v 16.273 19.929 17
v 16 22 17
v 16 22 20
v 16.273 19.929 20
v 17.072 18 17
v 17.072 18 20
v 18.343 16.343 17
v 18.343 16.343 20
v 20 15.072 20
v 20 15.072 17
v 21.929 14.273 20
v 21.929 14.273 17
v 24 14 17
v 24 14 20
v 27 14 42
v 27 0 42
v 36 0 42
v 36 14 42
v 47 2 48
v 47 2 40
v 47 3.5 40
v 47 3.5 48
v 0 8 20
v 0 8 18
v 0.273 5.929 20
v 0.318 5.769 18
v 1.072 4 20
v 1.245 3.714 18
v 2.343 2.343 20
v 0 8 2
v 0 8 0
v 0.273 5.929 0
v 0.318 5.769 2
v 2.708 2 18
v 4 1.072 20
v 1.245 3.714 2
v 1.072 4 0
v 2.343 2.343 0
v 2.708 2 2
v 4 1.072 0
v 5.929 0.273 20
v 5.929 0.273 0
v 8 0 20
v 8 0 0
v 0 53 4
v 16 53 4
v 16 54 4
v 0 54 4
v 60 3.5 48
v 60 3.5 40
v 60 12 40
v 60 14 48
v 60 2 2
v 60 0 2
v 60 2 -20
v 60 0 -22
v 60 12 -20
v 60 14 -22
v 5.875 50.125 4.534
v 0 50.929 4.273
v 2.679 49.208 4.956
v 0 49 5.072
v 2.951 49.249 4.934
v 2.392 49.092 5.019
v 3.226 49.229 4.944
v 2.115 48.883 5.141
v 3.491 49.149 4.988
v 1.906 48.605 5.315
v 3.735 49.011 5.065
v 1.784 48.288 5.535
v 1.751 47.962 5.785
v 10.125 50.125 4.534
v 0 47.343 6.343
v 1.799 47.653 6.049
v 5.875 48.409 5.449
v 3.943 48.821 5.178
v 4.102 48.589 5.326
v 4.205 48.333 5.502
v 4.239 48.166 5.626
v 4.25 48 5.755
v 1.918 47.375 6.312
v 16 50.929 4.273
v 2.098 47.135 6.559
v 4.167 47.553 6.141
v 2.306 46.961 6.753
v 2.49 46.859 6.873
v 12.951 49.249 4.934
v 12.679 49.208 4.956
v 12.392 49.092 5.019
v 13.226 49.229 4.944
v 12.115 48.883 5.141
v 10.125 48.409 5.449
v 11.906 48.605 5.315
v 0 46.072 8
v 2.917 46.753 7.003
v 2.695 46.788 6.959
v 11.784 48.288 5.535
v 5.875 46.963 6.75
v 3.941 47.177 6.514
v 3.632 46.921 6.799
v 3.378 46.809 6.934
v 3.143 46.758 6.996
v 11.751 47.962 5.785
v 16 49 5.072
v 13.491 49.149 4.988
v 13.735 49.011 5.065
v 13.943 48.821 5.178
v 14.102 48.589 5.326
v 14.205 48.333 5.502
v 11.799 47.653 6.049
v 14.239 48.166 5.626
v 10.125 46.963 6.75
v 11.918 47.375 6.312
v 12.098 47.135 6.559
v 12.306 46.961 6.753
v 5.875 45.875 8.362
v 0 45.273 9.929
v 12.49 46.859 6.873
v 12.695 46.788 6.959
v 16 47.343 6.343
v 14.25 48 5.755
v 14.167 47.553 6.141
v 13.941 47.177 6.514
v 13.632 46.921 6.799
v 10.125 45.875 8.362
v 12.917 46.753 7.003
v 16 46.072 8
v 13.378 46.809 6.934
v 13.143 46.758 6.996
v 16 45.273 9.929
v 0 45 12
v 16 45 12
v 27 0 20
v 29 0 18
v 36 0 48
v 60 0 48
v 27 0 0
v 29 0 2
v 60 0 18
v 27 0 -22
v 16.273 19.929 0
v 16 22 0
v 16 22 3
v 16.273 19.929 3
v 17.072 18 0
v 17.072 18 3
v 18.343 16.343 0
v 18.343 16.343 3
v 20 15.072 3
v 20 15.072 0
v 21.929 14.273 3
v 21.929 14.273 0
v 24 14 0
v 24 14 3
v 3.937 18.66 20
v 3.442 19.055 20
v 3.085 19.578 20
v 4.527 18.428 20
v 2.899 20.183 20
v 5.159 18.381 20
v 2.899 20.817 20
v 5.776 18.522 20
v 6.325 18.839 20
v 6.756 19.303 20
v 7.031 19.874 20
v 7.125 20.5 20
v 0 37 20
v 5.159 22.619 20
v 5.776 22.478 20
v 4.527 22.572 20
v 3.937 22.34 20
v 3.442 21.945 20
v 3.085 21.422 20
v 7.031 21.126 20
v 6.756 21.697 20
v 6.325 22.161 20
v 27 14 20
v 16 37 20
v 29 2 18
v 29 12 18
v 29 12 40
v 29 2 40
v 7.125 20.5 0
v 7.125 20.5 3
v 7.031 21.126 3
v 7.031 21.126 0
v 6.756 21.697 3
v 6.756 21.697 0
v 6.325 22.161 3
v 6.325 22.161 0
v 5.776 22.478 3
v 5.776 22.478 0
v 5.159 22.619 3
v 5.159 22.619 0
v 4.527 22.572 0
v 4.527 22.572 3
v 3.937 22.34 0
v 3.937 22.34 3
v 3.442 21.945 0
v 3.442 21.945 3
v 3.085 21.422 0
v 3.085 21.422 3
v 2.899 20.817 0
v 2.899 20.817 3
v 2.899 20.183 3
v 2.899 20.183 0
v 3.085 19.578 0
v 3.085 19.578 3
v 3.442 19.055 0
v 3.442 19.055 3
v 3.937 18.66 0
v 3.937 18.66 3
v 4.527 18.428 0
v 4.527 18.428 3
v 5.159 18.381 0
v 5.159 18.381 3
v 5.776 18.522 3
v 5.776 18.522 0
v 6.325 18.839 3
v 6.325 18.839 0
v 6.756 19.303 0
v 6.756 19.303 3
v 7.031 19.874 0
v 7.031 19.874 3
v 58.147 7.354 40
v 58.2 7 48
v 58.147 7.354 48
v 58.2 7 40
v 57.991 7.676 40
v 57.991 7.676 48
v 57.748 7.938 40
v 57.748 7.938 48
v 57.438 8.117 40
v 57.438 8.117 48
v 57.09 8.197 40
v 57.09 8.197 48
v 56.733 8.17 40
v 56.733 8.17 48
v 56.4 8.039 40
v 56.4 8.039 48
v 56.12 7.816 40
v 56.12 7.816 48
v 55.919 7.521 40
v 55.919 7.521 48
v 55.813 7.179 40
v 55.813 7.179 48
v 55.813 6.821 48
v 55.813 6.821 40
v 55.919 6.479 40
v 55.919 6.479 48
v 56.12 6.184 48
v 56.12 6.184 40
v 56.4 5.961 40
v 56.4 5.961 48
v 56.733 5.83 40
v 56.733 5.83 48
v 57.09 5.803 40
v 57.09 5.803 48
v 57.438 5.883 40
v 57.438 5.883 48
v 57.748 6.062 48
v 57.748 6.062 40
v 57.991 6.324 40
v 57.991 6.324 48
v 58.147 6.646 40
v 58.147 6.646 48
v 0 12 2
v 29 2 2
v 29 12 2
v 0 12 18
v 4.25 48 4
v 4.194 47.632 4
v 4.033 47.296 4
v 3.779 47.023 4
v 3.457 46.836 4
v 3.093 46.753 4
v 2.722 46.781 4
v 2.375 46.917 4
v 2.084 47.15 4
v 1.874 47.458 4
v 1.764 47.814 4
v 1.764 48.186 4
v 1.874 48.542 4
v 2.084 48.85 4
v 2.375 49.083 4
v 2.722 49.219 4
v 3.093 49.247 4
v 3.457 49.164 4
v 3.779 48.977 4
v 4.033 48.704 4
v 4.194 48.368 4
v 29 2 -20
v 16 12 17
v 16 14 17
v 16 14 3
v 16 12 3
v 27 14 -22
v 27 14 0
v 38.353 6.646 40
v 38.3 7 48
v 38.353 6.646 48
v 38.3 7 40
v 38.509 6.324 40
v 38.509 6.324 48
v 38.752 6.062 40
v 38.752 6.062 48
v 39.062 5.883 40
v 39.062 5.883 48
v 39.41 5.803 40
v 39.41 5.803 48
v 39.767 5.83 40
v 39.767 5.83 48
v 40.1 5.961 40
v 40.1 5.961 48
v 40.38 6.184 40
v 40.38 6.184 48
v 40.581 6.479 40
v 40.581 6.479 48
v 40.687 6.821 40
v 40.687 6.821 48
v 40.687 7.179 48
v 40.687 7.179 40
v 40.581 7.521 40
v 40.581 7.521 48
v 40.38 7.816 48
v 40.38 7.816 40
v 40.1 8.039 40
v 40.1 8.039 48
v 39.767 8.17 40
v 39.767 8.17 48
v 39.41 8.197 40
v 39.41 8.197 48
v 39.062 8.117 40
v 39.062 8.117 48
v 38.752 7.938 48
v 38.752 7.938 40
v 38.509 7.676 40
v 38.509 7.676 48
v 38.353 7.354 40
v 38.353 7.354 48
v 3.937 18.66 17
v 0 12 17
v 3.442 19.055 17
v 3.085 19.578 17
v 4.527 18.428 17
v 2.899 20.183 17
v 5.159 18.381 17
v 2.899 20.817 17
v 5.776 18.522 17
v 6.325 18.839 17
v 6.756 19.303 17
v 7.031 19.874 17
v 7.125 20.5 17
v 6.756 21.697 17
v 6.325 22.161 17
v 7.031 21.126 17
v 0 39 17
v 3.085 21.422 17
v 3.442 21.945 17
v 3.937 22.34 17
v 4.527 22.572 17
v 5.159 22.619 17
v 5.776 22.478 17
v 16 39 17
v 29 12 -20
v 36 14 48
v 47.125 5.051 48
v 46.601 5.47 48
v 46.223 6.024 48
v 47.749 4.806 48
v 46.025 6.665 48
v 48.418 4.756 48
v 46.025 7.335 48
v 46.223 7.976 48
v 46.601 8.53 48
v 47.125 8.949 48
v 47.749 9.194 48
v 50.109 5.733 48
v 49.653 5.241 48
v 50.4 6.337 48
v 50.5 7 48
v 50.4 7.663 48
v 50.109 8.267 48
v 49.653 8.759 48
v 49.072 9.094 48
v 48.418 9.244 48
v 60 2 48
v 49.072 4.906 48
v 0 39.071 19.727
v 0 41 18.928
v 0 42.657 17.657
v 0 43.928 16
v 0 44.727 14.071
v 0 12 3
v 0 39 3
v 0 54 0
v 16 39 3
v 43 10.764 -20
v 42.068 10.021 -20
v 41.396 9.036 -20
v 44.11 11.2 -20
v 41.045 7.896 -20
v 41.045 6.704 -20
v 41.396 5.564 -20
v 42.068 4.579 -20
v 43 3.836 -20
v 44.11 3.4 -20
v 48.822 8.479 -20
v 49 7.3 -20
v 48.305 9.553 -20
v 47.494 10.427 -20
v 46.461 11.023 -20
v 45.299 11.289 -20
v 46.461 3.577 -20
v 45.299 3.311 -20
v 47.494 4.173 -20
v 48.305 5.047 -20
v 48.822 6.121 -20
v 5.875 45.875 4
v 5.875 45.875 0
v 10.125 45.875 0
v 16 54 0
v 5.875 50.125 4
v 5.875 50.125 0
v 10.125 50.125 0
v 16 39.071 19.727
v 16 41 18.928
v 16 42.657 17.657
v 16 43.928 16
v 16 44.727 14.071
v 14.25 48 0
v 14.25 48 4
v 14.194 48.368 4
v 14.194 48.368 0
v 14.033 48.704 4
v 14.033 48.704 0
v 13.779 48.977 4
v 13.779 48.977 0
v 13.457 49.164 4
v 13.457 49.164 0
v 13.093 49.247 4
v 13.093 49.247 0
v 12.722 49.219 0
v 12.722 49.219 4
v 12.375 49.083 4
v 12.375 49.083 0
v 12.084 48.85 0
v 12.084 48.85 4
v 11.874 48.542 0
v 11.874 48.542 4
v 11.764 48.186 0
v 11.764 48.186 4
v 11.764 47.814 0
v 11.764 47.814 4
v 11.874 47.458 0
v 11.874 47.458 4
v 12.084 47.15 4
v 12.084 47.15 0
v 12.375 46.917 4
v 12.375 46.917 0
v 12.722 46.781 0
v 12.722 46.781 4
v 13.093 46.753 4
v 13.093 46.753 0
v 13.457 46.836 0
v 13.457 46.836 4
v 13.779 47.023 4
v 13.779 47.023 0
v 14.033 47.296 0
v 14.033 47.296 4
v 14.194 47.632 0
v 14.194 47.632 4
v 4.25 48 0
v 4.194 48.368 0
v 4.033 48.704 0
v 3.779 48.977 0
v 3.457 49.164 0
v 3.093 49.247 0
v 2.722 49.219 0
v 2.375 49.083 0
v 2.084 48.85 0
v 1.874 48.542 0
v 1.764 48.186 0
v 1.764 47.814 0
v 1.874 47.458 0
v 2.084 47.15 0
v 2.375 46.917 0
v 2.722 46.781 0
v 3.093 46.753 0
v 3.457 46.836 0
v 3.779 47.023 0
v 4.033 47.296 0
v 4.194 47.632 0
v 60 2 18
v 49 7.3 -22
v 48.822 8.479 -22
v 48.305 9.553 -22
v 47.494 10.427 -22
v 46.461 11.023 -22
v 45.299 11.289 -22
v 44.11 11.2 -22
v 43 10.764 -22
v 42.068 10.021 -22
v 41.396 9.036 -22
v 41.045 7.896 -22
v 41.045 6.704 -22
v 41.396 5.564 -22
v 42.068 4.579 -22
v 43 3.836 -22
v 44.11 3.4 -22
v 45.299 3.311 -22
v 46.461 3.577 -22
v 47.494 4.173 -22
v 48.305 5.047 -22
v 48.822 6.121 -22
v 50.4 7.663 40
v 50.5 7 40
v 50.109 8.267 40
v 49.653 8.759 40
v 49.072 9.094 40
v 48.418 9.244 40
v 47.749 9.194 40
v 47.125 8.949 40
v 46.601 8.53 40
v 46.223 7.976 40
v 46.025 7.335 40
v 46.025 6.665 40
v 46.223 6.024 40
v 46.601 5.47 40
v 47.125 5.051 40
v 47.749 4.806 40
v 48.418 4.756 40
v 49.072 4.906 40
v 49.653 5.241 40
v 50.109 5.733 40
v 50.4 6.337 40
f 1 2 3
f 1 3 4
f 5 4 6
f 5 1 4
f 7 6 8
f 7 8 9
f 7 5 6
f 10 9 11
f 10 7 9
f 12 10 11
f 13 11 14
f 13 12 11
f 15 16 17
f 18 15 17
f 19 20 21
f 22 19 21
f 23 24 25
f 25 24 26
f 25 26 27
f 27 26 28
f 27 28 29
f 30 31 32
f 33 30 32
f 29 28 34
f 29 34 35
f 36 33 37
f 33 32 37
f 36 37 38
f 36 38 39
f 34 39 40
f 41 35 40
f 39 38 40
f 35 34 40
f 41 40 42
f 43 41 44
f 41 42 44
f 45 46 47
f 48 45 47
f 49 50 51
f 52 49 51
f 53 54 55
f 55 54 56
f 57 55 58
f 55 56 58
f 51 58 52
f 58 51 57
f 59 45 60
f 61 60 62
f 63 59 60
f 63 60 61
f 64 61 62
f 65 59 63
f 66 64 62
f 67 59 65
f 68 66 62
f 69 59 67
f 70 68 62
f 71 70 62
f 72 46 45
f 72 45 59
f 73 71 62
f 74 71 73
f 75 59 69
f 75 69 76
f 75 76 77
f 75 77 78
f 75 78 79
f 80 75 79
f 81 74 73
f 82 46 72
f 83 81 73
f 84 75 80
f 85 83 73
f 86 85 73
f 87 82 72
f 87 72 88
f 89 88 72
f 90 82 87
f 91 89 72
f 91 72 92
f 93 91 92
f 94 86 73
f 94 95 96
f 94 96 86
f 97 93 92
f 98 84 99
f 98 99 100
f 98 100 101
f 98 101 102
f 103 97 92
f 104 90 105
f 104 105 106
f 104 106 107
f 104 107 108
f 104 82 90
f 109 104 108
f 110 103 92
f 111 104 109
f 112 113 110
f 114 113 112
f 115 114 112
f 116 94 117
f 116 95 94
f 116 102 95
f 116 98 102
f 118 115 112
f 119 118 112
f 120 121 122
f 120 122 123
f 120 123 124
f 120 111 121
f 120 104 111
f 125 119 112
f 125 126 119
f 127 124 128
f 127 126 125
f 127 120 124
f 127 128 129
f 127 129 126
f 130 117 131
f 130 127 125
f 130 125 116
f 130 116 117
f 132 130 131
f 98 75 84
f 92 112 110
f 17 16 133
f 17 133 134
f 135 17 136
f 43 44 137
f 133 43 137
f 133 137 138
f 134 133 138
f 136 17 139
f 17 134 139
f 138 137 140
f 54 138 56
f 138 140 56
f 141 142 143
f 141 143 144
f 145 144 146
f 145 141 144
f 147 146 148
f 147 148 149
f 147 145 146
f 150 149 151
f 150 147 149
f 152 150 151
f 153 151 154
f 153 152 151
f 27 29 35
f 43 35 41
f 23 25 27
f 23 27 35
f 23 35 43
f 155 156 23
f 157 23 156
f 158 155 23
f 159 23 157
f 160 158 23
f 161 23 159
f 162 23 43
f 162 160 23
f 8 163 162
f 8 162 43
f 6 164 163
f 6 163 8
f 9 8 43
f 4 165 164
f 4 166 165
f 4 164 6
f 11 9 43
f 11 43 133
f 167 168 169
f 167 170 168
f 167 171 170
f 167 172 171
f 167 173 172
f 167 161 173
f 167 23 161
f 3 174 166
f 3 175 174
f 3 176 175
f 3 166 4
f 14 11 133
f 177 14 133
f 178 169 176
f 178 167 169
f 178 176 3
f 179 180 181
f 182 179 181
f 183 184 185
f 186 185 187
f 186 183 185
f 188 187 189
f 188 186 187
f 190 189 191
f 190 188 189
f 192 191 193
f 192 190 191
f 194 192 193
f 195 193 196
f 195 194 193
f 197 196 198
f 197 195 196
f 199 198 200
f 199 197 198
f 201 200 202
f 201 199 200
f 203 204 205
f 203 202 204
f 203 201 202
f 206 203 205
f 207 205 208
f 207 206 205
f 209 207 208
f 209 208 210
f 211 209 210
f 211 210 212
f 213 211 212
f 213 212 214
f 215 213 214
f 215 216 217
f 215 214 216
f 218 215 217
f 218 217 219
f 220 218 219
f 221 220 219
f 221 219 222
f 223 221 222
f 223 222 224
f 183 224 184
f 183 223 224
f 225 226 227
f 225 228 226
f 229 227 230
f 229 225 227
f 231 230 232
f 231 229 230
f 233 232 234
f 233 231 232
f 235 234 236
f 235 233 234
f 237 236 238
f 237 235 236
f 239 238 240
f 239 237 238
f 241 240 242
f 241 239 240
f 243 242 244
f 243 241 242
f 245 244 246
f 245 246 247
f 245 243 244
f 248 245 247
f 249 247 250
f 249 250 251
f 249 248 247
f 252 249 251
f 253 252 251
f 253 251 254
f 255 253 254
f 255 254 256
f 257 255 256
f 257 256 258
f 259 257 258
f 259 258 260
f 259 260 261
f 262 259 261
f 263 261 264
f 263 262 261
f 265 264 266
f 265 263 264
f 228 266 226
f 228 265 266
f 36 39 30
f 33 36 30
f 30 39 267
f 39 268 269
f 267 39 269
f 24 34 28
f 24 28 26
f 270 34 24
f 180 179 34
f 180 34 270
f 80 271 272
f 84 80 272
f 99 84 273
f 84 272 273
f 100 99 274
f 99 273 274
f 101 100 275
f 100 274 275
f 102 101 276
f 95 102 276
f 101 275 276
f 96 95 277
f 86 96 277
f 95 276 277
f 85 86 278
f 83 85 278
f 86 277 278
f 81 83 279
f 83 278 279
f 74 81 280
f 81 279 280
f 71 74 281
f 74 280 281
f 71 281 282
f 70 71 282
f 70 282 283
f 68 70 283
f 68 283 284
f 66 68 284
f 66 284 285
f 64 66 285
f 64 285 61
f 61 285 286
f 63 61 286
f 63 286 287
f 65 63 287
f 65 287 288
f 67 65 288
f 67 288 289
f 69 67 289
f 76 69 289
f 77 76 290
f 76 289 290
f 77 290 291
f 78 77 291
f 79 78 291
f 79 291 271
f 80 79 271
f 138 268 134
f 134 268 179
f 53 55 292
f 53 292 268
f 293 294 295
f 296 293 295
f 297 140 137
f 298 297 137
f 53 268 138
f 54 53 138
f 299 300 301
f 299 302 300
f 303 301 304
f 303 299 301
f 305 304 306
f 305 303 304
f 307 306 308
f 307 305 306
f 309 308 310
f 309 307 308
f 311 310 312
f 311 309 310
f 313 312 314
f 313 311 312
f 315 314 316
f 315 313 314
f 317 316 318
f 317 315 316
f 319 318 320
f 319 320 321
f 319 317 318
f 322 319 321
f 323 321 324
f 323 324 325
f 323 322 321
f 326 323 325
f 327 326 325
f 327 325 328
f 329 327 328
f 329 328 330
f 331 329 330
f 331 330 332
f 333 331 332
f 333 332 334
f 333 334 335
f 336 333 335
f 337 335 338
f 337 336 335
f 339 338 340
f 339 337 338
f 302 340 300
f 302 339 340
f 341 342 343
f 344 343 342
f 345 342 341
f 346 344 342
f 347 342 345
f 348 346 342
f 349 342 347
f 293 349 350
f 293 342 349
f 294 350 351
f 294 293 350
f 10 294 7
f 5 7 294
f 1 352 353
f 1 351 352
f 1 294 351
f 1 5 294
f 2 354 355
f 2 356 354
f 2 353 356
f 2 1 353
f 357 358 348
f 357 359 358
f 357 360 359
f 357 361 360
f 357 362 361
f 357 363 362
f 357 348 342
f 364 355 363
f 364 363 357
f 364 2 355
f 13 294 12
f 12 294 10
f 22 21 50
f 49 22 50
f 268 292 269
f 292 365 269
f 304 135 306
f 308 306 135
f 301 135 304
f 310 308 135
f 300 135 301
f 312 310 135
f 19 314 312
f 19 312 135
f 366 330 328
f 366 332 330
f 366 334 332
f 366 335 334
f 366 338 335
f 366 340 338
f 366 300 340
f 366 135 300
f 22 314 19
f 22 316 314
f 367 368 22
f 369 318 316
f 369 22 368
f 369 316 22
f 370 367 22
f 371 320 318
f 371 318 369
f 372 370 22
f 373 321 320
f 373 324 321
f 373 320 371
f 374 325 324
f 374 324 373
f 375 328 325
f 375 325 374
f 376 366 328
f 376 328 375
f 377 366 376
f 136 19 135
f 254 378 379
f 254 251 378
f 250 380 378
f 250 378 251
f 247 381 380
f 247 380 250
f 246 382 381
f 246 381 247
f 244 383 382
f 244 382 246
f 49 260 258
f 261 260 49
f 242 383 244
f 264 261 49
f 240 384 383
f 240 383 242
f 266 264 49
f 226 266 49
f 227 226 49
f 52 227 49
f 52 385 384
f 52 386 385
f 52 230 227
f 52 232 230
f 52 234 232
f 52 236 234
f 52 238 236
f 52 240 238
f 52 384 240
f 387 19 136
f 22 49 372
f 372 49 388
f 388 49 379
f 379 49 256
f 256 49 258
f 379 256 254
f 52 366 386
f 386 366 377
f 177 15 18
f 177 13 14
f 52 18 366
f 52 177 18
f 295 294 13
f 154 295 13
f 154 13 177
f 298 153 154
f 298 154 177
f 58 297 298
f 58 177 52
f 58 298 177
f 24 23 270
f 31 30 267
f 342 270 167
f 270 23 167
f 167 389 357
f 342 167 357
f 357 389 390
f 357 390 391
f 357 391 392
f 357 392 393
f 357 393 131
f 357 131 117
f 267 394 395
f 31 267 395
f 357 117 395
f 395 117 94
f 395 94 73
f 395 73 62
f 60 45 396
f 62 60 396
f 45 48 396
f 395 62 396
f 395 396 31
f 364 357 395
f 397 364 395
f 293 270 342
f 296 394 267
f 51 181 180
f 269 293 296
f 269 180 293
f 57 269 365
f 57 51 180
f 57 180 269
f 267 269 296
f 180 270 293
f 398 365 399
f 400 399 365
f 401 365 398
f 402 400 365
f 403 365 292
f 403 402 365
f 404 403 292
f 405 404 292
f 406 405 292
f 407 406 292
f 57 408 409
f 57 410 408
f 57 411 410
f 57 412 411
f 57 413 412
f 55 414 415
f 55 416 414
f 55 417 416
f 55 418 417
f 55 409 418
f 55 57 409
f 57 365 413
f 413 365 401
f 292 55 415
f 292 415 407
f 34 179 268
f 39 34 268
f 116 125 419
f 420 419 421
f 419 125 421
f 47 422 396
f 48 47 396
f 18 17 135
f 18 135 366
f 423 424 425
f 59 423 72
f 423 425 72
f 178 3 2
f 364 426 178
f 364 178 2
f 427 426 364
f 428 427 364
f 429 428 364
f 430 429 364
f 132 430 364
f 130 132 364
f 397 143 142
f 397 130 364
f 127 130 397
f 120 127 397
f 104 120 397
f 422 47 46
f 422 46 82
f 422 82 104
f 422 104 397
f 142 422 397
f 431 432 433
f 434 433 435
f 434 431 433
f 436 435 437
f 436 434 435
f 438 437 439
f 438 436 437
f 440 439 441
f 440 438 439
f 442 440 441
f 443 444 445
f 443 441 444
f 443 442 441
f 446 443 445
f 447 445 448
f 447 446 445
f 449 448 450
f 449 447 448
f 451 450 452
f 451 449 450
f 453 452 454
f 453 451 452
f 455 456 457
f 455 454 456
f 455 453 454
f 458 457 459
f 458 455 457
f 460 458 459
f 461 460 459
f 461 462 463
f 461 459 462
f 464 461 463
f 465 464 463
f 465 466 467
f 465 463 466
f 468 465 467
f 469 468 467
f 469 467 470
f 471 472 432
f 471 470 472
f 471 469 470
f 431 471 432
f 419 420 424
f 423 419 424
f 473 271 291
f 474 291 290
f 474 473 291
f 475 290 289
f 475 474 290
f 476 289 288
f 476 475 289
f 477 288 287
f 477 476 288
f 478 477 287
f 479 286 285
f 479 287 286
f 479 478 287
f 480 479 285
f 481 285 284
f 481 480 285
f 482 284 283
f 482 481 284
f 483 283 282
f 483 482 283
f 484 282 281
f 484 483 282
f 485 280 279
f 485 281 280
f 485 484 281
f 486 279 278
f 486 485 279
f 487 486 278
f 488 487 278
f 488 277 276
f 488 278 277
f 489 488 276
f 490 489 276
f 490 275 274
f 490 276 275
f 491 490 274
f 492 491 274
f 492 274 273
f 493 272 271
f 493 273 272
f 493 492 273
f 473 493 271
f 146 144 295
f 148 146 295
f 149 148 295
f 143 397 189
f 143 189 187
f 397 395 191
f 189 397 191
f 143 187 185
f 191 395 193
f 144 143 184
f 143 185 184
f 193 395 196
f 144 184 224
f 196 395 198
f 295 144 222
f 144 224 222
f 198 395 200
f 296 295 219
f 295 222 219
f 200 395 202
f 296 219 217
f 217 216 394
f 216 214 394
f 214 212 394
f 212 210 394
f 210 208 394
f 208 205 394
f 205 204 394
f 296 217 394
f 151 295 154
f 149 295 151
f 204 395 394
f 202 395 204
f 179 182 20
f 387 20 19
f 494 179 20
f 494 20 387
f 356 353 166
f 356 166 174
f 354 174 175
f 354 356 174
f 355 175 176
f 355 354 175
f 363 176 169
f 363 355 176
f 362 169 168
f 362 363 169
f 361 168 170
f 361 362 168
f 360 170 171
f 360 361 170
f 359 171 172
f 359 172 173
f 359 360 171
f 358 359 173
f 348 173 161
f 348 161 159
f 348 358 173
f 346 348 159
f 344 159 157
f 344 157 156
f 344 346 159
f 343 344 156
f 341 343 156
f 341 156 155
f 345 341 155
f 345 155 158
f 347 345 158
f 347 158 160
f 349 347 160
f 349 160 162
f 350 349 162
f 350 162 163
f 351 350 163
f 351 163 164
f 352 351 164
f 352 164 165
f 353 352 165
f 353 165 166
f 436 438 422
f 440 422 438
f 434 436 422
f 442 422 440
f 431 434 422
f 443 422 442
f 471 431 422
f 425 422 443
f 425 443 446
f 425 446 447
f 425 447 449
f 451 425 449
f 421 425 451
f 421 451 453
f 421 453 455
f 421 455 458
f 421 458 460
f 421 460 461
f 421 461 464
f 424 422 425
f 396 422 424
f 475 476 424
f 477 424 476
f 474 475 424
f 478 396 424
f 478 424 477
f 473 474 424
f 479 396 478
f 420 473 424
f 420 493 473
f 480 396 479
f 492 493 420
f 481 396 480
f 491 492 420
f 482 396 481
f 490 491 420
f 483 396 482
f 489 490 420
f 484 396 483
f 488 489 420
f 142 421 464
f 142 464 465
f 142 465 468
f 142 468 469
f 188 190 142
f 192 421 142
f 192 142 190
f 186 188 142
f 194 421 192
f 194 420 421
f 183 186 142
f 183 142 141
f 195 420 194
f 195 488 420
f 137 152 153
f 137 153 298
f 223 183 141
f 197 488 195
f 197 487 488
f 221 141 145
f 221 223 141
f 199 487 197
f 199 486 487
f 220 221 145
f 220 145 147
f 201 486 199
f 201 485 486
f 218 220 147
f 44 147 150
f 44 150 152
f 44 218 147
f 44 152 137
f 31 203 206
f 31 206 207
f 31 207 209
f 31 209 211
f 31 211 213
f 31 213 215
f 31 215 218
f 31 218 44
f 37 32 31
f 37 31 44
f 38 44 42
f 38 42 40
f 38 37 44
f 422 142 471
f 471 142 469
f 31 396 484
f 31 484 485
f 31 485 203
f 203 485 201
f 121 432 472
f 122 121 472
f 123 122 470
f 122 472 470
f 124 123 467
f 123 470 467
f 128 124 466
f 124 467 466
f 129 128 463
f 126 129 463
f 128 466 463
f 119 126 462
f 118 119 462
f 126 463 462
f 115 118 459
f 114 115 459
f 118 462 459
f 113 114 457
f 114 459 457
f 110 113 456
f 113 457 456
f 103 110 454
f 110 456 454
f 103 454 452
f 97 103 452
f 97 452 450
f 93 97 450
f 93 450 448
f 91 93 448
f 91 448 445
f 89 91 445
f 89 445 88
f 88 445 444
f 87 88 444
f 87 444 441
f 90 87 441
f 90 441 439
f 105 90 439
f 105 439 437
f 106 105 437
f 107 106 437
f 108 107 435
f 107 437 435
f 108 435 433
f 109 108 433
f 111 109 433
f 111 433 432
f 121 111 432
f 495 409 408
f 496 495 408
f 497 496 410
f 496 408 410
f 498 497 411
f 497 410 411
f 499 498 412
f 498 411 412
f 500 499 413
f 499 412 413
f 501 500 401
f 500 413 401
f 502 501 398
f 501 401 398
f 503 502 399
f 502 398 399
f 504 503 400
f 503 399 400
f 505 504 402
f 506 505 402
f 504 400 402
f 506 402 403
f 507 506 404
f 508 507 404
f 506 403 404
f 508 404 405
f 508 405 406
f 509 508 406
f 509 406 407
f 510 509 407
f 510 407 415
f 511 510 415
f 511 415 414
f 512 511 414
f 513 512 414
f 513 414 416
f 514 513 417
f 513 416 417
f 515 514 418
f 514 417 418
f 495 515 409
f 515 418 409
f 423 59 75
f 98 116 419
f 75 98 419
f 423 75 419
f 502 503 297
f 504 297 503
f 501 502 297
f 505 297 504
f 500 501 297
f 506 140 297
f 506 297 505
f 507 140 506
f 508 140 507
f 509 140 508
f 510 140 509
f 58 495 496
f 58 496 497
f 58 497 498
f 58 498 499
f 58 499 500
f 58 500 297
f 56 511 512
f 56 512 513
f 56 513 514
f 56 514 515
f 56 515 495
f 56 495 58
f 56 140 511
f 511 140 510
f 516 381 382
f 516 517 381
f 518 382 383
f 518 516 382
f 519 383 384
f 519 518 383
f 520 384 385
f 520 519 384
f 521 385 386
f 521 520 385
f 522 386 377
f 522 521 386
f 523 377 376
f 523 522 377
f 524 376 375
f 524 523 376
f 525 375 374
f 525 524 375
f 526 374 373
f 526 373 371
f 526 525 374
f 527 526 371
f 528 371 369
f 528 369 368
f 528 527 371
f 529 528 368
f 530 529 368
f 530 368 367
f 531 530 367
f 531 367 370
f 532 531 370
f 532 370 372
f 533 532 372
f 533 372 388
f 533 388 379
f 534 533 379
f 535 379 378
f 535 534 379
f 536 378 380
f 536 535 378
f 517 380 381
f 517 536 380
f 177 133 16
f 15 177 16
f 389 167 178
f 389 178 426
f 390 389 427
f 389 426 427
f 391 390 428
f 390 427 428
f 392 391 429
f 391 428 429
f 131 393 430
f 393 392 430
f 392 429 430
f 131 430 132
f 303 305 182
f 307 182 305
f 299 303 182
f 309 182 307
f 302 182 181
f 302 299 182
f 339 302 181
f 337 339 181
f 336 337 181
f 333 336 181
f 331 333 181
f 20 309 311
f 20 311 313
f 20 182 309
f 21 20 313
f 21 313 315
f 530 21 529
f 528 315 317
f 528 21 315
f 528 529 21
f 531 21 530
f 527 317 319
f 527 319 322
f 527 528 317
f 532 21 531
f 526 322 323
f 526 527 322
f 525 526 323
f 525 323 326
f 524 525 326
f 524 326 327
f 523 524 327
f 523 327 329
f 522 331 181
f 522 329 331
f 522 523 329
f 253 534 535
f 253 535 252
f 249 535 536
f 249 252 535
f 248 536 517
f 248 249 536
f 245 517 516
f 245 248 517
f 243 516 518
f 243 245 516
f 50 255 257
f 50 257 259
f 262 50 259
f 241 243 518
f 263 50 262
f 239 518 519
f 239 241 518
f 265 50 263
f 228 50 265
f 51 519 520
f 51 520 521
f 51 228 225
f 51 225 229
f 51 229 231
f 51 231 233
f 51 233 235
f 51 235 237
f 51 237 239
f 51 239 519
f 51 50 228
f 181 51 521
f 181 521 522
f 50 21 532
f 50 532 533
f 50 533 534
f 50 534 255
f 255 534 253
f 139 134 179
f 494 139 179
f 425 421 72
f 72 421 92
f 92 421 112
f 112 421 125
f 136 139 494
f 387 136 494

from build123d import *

# Parameters (mm, degrees)
SKETCH1_R           = 2.125
SKETCH1_R_2         = 1.25
SKETCH1_W           = 4.25
SKETCH1_H           = 4.25
BOSS_EXTRUDE1_DEPTH = 20
SKETCH2_W           = 14
SKETCH2_H           = 37
SKETCH2_W_2         = 16
SKETCH2_H_2         = 9
CUT_EXTRUDE1_DEPTH  = 73.470683728
SKETCH3_W           = 33
SKETCH3_H           = 22
BOSS_EXTRUDE2_DEPTH = 14
CUT_EXTRUDE2_DEPTH  = 31
SKETCH5_W           = 16
SKETCH5_H           = 10
CUT_EXTRUDE3_DEPTH  = 29
SKETCH7_R           = 4
CUT_EXTRUDE5_DEPTH  = 2
SKETCH8_W           = 24
SKETCH8_H           = 14
SKETCH8_R           = 1.2
SKETCH8_R_2         = 2.25
BOSS_EXTRUDE3_DEPTH = 6
CUT_EXTRUDE6_START  = -8
SKETCH9_R           = 2.25
SKETCH9_R_2         = 1.2
SKETCH9_W           = 13
SKETCH9_H           = 1.5
CUT_EXTRUDE6_DEPTH  = 8
FILLET1_R           = 8


with BuildPart() as part:
    # Sketch1 → Boss-Extrude1 (new body)
    with BuildSketch(Plane.XY):
        Polygon((16, 54), (0, 54), (0, 0), (60, 0), (60, 14), (16, 14), align=None)
        with Locations((5, 20.5)):
            Circle(SKETCH1_R, mode=Mode.SUBTRACT)
        with Locations((13, 48)):
            Circle(SKETCH1_R_2, mode=Mode.SUBTRACT)
        with Locations((3, 48)):
            Circle(SKETCH1_R_2, mode=Mode.SUBTRACT)
        with Locations((8, 48)):
            Rectangle(SKETCH1_W, SKETCH1_H, mode=Mode.SUBTRACT)
    extrude(amount=BOSS_EXTRUDE1_DEPTH)

    # Sketch2 → Cut-Extrude1 (cut, through all)
    with BuildSketch(Plane(origin=(16, 0, 0), x_dir=(0, 0, -1), z_dir=(1, 0, 0))):
        with Locations((-10, 20.5)):
            Rectangle(SKETCH2_W, SKETCH2_H)
        with Locations((-12, 49.5)):
            Rectangle(SKETCH2_W_2, SKETCH2_H_2)
    extrude(amount=-CUT_EXTRUDE1_DEPTH, mode=Mode.SUBTRACT)

    # Sketch3 → Boss-Extrude2 (add)
    with BuildSketch(Plane.XZ):
        with Locations((43.5, 31)):
            Rectangle(SKETCH3_W, SKETCH3_H)
        with Locations((43.5, -11)):
            Rectangle(SKETCH3_W, SKETCH3_H)
    extrude(amount=-BOSS_EXTRUDE2_DEPTH)

    # Sketch4 → Cut-Extrude2 (cut)
    with BuildSketch(Plane(origin=(60, 0, 0), x_dir=(0, 0, -1), z_dir=(1, 0, 0))):
        Polygon((-18, 0), (-18, 2), (-40, 2), (-40, 12), (20, 12), (20, 2), (-2, 2), (-2, 0), align=None)
    extrude(amount=-CUT_EXTRUDE2_DEPTH, mode=Mode.SUBTRACT)

    # Sketch5 → Cut-Extrude3 (cut)
    with BuildSketch(Plane(origin=(29, 0, 0), x_dir=(0, 0, -1), z_dir=(1, 0, 0))):
        with Locations((-10, 7)):
            Rectangle(SKETCH5_W, SKETCH5_H)
    extrude(amount=-CUT_EXTRUDE3_DEPTH, mode=Mode.SUBTRACT)

    # Sketch7 → Cut-Extrude5 (cut)
    with BuildSketch(Plane.XY.offset(-20)):
        with Locations((45, 7.3)):
            Circle(SKETCH7_R)
    extrude(amount=-CUT_EXTRUDE5_DEPTH, mode=Mode.SUBTRACT)

    # Sketch8 → Boss-Extrude3 (add)
    with BuildSketch(Plane.XY.offset(42)):
        with Locations((48, 7)):
            Rectangle(SKETCH8_W, SKETCH8_H)
        with Locations((57, 7)):
            Circle(SKETCH8_R, mode=Mode.SUBTRACT)
        with Locations((48.25, 7)):
            Circle(SKETCH8_R_2, mode=Mode.SUBTRACT)
        with Locations(Location((39.5, 7, 0), (0, 0, 180))):
            Circle(SKETCH8_R, mode=Mode.SUBTRACT)
    extrude(amount=BOSS_EXTRUDE3_DEPTH)

    # Sketch9 → Cut-Extrude6 (cut)
    with BuildSketch(Plane.XY.offset(48).offset(CUT_EXTRUDE6_START)):
        with Locations((48.25, 7)):
            Circle(SKETCH9_R)
        with Locations((57, 7)):
            Circle(SKETCH9_R_2)
        with Locations(Location((39.5, 7, 0), (0, 0, 180))):
            Circle(SKETCH9_R_2)
        with Locations((53.5, 2.75)):
            Rectangle(SKETCH9_W, SKETCH9_H)
    extrude(amount=CUT_EXTRUDE6_DEPTH, mode=Mode.SUBTRACT)

    # Fillet1
    # the kernel refuses this fillet: 8 mm, written as the material it adds along each edge
    with BuildSketch(Plane(origin=(16, 14, 0), x_dir=(0, 1, 0), z_dir=(0, 0, 1)), Plane(origin=(16, 14, 17), x_dir=(0, 1, 0), z_dir=(0, 0, 1))) as fillet1_piece_1:
        with BuildLine():
            CenterArc((FILLET1_R, -FILLET1_R), FILLET1_R, 90, 90)
            Line((0, -FILLET1_R), (0, 0))
            Line((0, 0), (FILLET1_R, 0))
        make_face()
    extrude(amount=3)
    with BuildSketch(Plane(origin=(16, 14, -20), x_dir=(0, 1, 0), z_dir=(0, 0, 1))) as fillet1_piece_2_section:
        with BuildLine():
            CenterArc((FILLET1_R, -FILLET1_R), FILLET1_R, 90, 90)
            Line((0, -FILLET1_R), (0, 0))
            Line((0, 0), (FILLET1_R, 0))
        make_face()
    fillet1_piece_2 = extrude(amount=43, mode=Mode.PRIVATE)
    fillet1_piece_2 = split(fillet1_piece_2, bisect_by=Plane(origin=(17.786943512, 15.786943512, 17), z_dir=(0, 0, 1)), keep=Keep.TOP, mode=Mode.PRIVATE)
    fillet1_piece_2 = split(fillet1_piece_2, bisect_by=Plane(origin=(17.786943512, 15.786943512, 20), z_dir=(0, 0, -1)), keep=Keep.TOP, mode=Mode.PRIVATE)
    add(fillet1_piece_2)
    with BuildSketch(Plane(origin=(16, 14, -3), x_dir=(0, 1, 0), z_dir=(0, 0, 1))) as fillet1_piece_3_section:
        with BuildLine():
            CenterArc((FILLET1_R, -FILLET1_R), FILLET1_R, 90, 90)
            Line((0, -FILLET1_R), (0, 0))
            Line((0, 0), (FILLET1_R, 0))
        make_face()
    fillet1_piece_3 = extrude(amount=43, mode=Mode.PRIVATE)
    fillet1_piece_3 = split(fillet1_piece_3, bisect_by=Plane(origin=(17.786943512, 15.786943512, 3), z_dir=(0, 0, -1)), keep=Keep.TOP, mode=Mode.PRIVATE)
    fillet1_piece_3 = split(fillet1_piece_3, bisect_by=Plane(origin=(17.786943512, 15.786943512, 0), z_dir=(0, 0, 1)), keep=Keep.TOP, mode=Mode.PRIVATE)
    add(fillet1_piece_3)
    with BuildSketch(Plane(origin=(16, 45, 4), x_dir=(0, 0, 1), z_dir=(-1, 0, 0))) as fillet1_piece_4_section:
        with BuildLine():
            CenterArc((FILLET1_R, FILLET1_R), FILLET1_R, 180, 90)
            Line((0, FILLET1_R), (0, 0))
            Line((0, 0), (FILLET1_R, 0))
        make_face()
    fillet1_piece_4 = extrude(amount=36, mode=Mode.PRIVATE)
    fillet1_piece_4 = fillet1_piece_4 - Plane(origin=(13, 48, 6.838985296), x_dir=(1, 0, 0), z_dir=(0, 0, -1)) * Cylinder(1.25, 105, mode=Mode.PRIVATE)
    fillet1_piece_4 = split(fillet1_piece_4, bisect_by=Plane(origin=(10.125, 45.39955256, 6.838985296), z_dir=(1, 0, 0)), keep=Keep.TOP, mode=Mode.PRIVATE)
    add(fillet1_piece_4)
    with BuildSketch(Plane(origin=(36, 45, 4), x_dir=(0, 0, 1), z_dir=(-1, 0, 0))) as fillet1_piece_5_section:
        with BuildLine():
            CenterArc((FILLET1_R, FILLET1_R), FILLET1_R, 180, 90)
            Line((0, FILLET1_R), (0, 0))
            Line((0, 0), (FILLET1_R, 0))
        make_face()
    fillet1_piece_5 = extrude(amount=36, mode=Mode.PRIVATE)
    fillet1_piece_5 = split(fillet1_piece_5, bisect_by=Plane(origin=(8, 45.875, 6.838985296), z_dir=(0, -1, 0)), keep=Keep.TOP, mode=Mode.PRIVATE)
    fillet1_piece_5 = split(fillet1_piece_5, bisect_by=Plane(origin=(10.125, 45.39955256, 6.838985296), z_dir=(-1, 0, 0)), keep=Keep.TOP, mode=Mode.PRIVATE)
    add(fillet1_piece_5)
    with BuildSketch(Plane(origin=(36, 45, 4), x_dir=(0, 0, 1), z_dir=(-1, 0, 0))) as fillet1_piece_6_section:
        with BuildLine():
            CenterArc((FILLET1_R, FILLET1_R), FILLET1_R, 180, 90)
            Line((0, FILLET1_R), (0, 0))
            Line((0, 0), (FILLET1_R, 0))
        make_face()
    fillet1_piece_6 = extrude(amount=36, mode=Mode.PRIVATE)
    fillet1_piece_6 = split(fillet1_piece_6, bisect_by=Plane(origin=(8, 50.125, 4.159374376), z_dir=(0, 1, 0)), keep=Keep.TOP, mode=Mode.PRIVATE)
    fillet1_piece_6 = split(fillet1_piece_6, bisect_by=Plane(origin=(10.125, 50.838860547, 4.159374376), z_dir=(-1, 0, 0)), keep=Keep.TOP, mode=Mode.PRIVATE)
    add(fillet1_piece_6)
    with BuildSketch(Plane(origin=(36, 45, 4), x_dir=(0, 0, 1), z_dir=(-1, 0, 0))) as fillet1_piece_7_section:
        with BuildLine():
            CenterArc((FILLET1_R, FILLET1_R), FILLET1_R, 180, 90)
            Line((0, FILLET1_R), (0, 0))
            Line((0, 0), (FILLET1_R, 0))
        make_face()
    fillet1_piece_7 = extrude(amount=36, mode=Mode.PRIVATE)
    fillet1_piece_7 = split(fillet1_piece_7, bisect_by=Plane(origin=(5.875, 46.341604388, 7.503816855), z_dir=(-1, 0, 0)), keep=Keep.TOP, mode=Mode.PRIVATE)
    fillet1_piece_7 = fillet1_piece_7 - Plane(origin=(3, 48, 7.503816855), x_dir=(1, 0, 0), z_dir=(0, 0, -1)) * Cylinder(1.25, 105, mode=Mode.PRIVATE)
    add(fillet1_piece_7)
    # the kernel refuses this fillet: 8 mm, written as the material it takes off along each edge
    with BuildSketch(Plane(origin=(0, 0, -20), x_dir=(0, 1, 0), z_dir=(0, 0, 1))) as fillet1_2_piece_1:
        with BuildLine():
            CenterArc((FILLET1_R, -FILLET1_R), FILLET1_R, 90, 90)
            Line((0, -FILLET1_R), (0, 0))
            Line((0, 0), (FILLET1_R, 0))
        make_face()
    extrude(amount=60, mode=Mode.SUBTRACT)
    with BuildSketch(Plane(origin=(36, 45, 20), x_dir=(0, 0, -1), z_dir=(-1, 0, 0))) as fillet1_2_piece_2:
        with BuildLine():
            CenterArc((FILLET1_R, FILLET1_R), FILLET1_R, 180, 90)
            Line((0, FILLET1_R), (0, 0))
            Line((0, 0), (FILLET1_R, 0))
        make_face()
    extrude(amount=56, mode=Mode.SUBTRACT)


solid = part.part
